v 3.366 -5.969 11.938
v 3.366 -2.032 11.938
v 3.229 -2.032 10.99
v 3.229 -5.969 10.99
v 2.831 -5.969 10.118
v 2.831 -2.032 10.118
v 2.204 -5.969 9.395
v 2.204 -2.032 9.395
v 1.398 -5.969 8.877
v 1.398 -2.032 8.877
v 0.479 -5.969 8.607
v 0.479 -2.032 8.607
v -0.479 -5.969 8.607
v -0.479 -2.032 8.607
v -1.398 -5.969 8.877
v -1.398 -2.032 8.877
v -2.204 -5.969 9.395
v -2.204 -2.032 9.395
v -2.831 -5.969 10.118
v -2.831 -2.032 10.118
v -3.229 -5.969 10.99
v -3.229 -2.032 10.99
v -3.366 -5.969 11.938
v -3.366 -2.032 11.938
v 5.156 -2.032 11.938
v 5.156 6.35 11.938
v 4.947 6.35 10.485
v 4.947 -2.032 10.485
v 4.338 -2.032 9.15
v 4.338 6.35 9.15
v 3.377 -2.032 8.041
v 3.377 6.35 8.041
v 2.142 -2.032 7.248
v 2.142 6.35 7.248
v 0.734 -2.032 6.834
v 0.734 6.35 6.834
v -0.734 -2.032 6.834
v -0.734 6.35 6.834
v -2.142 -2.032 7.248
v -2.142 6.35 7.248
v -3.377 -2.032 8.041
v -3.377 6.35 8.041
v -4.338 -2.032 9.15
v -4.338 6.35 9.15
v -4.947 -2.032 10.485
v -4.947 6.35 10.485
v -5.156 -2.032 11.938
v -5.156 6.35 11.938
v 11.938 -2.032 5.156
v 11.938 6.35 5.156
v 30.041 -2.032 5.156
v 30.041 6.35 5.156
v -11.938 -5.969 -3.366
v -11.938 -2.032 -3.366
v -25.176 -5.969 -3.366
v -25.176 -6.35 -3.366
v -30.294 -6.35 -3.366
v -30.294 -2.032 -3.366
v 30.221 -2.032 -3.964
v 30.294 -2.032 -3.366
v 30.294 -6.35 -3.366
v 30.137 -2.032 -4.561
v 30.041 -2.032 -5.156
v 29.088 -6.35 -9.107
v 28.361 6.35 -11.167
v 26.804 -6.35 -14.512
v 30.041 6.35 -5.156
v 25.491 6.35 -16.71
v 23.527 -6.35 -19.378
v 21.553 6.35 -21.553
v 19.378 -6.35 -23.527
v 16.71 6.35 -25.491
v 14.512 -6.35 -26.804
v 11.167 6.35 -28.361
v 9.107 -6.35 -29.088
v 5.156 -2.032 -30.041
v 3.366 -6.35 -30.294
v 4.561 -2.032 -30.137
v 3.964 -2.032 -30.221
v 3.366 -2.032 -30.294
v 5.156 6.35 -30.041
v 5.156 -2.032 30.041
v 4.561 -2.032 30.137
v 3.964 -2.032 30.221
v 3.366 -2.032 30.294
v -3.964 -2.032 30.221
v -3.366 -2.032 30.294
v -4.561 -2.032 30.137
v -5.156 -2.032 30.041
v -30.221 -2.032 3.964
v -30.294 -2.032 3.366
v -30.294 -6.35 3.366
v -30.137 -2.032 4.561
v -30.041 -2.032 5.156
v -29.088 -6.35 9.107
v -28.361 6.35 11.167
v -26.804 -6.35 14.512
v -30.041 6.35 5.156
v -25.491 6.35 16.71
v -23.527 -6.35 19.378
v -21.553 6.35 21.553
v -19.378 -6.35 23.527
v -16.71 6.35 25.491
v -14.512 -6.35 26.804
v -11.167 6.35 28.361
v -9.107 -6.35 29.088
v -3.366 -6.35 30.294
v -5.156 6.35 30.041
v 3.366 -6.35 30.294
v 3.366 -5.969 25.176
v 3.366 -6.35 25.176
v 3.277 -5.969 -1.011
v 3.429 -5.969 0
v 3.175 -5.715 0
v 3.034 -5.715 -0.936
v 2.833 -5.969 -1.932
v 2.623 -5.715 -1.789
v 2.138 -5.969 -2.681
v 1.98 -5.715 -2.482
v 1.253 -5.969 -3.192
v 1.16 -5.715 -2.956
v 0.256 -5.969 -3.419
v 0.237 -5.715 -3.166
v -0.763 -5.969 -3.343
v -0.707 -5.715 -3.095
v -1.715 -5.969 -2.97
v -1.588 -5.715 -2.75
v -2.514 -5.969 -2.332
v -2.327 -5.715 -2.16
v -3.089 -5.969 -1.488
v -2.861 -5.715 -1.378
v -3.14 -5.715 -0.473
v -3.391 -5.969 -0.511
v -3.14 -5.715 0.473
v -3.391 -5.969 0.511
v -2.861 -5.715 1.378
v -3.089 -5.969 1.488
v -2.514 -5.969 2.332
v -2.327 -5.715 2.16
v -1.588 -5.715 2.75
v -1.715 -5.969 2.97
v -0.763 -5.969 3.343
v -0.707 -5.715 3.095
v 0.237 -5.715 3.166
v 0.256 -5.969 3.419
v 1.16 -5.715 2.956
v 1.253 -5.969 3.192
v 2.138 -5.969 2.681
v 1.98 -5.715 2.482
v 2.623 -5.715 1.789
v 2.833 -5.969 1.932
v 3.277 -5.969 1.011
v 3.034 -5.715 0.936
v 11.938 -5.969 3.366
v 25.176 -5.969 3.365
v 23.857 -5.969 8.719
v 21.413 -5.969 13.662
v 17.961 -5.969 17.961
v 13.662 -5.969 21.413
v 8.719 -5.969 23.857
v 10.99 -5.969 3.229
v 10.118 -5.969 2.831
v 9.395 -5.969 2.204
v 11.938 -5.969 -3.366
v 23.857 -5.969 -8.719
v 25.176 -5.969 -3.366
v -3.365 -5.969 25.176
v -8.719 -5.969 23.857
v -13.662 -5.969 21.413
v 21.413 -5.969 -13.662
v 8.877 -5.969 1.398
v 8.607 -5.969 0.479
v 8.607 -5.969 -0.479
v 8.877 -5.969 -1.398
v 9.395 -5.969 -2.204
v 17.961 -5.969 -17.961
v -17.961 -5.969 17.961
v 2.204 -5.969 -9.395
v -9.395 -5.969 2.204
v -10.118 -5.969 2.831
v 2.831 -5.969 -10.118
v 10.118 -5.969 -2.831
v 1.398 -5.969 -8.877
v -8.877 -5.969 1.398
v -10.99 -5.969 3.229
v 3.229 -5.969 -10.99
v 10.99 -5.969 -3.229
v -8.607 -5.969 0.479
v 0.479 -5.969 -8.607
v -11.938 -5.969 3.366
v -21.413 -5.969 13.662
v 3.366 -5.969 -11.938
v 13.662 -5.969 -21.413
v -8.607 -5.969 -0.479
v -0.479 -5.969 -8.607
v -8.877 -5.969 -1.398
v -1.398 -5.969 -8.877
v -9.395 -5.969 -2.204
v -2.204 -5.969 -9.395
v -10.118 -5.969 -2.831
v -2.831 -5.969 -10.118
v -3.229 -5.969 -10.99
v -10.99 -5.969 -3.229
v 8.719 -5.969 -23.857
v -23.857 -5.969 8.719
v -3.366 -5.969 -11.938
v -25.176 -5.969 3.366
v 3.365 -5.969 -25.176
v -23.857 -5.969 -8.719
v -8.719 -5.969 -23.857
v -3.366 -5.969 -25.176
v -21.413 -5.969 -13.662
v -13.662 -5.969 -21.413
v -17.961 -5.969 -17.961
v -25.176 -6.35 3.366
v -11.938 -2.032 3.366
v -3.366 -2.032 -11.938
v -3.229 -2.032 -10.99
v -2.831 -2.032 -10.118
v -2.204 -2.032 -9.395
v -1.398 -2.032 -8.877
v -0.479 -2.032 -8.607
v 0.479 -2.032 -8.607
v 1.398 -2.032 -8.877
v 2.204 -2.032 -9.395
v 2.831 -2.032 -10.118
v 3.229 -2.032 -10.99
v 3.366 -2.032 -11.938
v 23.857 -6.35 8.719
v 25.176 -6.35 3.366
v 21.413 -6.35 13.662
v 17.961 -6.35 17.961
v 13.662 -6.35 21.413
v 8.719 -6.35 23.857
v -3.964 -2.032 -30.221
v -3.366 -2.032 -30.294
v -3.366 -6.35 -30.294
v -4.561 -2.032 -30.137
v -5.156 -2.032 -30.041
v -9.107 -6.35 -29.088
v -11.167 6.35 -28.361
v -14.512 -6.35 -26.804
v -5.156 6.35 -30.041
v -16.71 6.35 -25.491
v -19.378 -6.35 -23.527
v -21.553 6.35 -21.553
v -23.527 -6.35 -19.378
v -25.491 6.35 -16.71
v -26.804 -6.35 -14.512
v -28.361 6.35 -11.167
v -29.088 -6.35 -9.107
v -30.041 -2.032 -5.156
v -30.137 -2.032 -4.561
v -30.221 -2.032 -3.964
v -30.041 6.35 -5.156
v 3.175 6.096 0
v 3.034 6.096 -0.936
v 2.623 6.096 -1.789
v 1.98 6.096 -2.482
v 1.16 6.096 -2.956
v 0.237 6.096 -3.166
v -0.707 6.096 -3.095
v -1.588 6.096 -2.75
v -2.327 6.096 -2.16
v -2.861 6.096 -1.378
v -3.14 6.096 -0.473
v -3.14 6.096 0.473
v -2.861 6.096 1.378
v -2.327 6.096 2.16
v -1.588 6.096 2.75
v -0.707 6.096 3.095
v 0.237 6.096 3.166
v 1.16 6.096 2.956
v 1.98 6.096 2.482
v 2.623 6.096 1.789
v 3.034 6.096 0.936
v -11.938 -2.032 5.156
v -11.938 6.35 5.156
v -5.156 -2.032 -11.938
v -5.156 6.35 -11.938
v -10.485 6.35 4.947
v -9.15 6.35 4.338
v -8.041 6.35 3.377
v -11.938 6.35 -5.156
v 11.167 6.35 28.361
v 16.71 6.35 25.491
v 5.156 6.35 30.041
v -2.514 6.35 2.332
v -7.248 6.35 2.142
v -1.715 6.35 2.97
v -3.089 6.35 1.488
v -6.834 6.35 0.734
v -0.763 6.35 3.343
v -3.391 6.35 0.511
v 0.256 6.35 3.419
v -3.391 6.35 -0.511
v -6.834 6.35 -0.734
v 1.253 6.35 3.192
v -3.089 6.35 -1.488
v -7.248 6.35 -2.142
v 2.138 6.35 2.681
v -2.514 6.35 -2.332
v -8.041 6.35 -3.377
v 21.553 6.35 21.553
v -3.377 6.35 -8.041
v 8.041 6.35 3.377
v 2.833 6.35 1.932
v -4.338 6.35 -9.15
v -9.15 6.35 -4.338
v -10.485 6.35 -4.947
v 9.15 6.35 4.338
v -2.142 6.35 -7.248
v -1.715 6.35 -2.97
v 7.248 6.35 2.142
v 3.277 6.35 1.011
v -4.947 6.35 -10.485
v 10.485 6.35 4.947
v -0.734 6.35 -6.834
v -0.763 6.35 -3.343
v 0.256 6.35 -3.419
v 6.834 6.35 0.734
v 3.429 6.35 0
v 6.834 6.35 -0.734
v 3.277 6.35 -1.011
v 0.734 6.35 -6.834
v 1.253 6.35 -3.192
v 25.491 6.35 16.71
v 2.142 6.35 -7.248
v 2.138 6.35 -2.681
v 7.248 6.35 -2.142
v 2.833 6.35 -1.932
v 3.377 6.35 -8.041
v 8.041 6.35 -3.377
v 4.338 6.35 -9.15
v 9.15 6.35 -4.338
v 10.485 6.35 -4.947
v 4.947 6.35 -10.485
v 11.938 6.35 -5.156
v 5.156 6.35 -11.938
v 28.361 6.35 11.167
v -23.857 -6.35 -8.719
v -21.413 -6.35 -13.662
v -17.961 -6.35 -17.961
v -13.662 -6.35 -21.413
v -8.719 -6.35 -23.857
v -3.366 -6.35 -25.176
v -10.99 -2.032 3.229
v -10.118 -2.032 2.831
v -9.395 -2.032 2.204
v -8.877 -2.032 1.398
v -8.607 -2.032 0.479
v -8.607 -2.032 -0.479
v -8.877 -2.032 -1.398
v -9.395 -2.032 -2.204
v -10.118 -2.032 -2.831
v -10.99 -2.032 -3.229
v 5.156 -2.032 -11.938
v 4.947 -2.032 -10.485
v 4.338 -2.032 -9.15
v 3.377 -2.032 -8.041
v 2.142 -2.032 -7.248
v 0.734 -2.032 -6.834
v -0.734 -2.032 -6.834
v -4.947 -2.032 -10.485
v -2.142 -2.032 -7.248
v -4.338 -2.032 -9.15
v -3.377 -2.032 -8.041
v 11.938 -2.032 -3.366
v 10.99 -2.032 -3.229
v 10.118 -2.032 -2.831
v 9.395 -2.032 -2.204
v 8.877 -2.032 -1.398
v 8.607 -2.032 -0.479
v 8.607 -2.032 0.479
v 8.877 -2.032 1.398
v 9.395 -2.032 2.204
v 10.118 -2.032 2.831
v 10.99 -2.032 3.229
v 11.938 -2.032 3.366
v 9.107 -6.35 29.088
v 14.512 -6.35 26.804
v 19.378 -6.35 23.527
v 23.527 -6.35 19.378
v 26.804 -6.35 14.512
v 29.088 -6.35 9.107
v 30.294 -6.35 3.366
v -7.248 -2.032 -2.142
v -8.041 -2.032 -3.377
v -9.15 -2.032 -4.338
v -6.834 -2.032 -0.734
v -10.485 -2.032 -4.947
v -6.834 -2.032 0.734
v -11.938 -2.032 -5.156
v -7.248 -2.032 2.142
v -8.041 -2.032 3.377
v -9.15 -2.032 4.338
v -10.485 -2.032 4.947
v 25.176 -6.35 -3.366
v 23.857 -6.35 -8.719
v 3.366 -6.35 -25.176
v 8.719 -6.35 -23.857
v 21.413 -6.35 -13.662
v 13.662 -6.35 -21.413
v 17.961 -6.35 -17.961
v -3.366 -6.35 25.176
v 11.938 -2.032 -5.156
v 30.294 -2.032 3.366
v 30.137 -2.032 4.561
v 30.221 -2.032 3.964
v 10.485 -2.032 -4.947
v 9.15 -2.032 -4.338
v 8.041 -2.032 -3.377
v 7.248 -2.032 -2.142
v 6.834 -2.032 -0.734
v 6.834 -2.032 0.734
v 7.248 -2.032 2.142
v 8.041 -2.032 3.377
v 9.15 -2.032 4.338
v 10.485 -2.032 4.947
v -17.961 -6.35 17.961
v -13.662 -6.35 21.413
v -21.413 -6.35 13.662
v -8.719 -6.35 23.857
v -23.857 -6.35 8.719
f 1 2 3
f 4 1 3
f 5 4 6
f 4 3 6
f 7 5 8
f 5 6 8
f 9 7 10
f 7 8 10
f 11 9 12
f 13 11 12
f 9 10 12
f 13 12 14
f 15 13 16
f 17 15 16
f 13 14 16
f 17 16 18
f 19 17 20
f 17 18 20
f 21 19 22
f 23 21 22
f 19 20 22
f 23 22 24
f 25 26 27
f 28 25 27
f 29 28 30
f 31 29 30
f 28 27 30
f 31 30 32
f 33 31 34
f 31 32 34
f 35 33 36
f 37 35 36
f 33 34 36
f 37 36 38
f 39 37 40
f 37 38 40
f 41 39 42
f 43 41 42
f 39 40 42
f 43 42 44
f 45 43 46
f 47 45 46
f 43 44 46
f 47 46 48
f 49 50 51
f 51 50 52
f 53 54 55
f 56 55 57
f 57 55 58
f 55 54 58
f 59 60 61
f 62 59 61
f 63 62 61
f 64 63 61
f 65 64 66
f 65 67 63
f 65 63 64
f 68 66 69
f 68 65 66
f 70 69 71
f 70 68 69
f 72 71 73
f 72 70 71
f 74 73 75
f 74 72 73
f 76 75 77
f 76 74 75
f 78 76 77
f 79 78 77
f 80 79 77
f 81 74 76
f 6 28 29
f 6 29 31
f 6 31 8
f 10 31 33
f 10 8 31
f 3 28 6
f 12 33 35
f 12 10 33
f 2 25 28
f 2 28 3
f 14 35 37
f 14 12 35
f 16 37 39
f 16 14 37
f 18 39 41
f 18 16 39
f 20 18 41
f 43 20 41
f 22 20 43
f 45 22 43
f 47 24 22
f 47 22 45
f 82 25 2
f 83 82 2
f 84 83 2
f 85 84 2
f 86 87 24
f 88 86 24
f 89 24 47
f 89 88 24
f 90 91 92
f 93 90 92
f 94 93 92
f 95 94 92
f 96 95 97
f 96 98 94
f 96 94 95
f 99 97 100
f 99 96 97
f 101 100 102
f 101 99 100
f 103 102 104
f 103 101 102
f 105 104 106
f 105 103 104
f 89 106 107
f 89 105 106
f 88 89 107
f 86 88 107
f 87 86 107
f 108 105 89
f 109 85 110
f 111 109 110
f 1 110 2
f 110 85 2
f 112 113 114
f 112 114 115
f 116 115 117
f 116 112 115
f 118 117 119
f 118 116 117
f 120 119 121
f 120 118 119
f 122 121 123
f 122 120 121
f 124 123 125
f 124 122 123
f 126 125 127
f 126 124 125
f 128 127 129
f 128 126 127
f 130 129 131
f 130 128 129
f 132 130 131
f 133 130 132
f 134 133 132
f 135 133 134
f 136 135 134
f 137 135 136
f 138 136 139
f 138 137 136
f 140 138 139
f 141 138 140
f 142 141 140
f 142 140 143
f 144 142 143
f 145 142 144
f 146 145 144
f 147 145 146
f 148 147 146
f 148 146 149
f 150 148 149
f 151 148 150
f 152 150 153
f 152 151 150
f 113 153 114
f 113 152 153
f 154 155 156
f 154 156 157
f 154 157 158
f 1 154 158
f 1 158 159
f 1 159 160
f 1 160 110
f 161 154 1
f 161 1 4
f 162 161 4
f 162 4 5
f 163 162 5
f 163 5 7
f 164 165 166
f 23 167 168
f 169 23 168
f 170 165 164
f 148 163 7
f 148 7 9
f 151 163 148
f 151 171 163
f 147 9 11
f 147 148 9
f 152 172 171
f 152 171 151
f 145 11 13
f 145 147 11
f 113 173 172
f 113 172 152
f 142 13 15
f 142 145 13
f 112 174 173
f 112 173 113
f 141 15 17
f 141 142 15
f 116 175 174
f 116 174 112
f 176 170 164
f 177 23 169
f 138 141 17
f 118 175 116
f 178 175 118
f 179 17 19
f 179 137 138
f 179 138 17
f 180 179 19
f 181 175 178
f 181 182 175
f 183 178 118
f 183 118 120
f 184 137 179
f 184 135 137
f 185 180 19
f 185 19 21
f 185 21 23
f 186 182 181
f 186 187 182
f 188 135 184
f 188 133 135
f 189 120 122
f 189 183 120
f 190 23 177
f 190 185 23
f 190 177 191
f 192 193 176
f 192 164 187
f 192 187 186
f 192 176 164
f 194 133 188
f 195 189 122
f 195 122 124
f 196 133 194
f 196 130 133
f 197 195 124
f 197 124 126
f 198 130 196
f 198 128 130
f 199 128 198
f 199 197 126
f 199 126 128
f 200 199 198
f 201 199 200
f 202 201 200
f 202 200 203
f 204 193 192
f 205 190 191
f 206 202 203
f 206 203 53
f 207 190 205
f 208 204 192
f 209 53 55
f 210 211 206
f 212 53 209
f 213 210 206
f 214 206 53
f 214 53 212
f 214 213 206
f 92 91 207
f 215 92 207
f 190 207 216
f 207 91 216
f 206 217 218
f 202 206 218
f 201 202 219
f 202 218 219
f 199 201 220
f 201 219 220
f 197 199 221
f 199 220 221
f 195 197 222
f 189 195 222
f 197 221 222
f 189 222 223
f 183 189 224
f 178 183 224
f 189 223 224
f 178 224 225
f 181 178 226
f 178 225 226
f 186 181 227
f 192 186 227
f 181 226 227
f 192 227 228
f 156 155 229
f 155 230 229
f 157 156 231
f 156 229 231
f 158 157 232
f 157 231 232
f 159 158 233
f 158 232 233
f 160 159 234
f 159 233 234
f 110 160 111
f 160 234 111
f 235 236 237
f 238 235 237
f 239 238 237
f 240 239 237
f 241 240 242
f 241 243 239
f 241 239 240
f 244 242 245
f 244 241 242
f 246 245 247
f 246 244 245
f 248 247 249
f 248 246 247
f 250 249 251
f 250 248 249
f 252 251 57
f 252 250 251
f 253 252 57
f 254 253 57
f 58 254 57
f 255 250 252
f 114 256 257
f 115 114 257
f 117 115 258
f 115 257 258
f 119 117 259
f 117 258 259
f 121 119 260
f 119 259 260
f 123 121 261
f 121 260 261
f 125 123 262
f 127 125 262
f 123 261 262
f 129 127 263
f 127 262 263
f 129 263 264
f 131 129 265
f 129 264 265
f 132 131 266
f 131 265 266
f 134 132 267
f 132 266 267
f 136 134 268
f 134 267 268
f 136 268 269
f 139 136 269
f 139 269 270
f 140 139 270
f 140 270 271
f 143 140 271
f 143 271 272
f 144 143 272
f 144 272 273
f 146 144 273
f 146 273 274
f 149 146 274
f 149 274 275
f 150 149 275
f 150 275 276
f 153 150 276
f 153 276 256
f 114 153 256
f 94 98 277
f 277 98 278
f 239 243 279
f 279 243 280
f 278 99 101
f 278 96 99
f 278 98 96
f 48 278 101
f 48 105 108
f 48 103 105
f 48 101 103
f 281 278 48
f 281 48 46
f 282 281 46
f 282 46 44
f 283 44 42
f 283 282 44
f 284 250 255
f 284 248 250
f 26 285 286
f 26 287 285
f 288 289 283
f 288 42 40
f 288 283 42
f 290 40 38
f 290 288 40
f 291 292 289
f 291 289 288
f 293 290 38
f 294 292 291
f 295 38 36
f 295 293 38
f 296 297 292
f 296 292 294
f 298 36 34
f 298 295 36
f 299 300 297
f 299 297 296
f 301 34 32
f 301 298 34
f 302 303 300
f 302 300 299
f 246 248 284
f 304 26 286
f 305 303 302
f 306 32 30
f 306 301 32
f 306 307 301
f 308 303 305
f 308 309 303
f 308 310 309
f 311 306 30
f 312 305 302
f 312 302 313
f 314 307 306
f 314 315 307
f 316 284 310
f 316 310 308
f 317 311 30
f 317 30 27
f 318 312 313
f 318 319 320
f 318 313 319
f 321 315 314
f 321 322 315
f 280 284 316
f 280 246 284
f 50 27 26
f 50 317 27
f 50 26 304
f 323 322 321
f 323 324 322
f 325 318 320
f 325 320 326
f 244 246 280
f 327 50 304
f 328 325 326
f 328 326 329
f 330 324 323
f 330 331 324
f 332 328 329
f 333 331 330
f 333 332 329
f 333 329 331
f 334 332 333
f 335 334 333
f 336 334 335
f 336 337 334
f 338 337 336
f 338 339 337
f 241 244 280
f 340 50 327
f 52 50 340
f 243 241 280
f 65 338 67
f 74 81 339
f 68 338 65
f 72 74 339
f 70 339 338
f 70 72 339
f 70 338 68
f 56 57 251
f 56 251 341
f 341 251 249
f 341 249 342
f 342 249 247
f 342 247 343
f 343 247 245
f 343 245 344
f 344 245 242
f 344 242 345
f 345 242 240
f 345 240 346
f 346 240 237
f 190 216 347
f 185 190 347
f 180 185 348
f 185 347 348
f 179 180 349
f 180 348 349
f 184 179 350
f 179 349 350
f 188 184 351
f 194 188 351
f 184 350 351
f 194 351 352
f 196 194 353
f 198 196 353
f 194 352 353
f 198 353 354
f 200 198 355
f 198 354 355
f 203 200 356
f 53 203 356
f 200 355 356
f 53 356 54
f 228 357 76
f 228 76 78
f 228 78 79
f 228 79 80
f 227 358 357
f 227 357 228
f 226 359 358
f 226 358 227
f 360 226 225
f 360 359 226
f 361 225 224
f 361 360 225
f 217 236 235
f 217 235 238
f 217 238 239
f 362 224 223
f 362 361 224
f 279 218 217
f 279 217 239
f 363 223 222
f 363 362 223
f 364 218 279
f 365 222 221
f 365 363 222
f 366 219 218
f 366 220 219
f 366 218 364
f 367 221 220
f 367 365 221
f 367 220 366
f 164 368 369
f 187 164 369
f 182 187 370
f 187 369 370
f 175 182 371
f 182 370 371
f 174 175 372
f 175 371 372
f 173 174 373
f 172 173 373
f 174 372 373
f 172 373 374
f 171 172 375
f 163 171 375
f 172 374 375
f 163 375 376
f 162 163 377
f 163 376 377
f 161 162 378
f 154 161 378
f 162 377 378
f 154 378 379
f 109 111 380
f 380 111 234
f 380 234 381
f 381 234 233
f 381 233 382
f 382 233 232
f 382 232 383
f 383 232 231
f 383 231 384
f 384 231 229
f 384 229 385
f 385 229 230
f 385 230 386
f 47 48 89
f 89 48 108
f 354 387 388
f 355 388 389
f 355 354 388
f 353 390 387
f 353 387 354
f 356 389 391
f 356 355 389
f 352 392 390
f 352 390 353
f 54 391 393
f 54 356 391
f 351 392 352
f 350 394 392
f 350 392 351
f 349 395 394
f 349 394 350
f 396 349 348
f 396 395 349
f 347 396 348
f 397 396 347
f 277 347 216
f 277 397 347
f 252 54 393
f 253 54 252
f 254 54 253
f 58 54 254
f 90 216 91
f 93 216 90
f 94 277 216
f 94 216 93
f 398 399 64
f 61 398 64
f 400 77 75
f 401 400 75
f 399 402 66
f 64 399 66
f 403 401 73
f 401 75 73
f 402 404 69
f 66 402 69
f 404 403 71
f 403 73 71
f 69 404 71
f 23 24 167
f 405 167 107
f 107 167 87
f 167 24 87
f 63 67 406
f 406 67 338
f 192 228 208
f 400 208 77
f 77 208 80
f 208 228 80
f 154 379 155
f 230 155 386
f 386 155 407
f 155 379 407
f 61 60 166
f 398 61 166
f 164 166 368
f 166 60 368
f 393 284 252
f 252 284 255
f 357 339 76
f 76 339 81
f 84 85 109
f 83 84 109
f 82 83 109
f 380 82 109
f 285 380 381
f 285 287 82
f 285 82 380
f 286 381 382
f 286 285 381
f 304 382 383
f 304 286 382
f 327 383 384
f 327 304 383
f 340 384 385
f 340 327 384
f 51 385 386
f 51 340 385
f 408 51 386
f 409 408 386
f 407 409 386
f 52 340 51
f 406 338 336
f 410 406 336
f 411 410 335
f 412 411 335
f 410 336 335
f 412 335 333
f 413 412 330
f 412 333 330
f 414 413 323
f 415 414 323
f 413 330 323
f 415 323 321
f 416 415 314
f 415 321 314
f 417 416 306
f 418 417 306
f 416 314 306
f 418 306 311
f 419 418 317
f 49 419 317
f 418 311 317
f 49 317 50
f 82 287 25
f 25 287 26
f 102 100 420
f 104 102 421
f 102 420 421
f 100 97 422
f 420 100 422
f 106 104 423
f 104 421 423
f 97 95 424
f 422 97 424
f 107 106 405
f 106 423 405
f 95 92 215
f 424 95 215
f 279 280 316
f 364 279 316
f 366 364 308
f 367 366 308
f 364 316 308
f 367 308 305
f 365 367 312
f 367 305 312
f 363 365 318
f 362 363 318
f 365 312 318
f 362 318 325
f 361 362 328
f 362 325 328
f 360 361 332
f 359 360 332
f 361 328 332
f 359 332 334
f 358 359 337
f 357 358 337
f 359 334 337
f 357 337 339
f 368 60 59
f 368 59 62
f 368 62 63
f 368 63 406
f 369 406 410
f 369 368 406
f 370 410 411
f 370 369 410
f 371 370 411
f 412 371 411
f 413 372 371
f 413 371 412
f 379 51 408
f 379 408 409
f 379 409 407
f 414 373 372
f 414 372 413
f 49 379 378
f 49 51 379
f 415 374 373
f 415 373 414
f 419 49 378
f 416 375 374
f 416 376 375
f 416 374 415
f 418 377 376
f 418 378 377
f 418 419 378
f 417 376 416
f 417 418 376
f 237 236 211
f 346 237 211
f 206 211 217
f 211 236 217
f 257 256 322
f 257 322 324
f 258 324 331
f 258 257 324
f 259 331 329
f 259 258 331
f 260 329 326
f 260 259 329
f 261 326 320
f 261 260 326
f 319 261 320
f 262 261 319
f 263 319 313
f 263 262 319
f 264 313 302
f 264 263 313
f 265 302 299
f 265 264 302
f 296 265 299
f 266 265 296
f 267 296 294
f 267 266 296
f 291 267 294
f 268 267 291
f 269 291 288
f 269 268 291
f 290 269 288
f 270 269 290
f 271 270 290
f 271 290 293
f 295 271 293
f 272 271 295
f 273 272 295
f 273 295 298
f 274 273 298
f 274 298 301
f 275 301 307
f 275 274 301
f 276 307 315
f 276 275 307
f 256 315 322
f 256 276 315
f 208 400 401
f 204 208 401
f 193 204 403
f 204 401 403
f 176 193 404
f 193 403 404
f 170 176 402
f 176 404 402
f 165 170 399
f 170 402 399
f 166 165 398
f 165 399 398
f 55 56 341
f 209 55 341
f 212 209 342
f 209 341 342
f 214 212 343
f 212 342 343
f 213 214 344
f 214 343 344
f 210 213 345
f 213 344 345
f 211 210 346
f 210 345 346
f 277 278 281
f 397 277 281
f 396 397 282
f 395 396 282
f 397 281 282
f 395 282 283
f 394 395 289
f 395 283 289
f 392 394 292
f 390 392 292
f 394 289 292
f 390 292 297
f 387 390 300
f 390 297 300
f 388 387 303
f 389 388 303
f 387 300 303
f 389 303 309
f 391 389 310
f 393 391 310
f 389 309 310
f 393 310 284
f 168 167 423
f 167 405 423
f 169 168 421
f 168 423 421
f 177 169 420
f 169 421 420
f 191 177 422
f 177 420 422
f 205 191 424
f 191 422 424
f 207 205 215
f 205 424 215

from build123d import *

# Parameters (mm, degrees)
SKETCH1_W          = 30.48
SKETCH1_H          = 12.7
CUT_EXTRUDE1_DEPTH = 8.382
CUT_EXTRUDE2_DEPTH = 5.318
CUT_EXTRUDE3_DEPTH = 8.382
CUT_EXTRUDE4_DEPTH = 5.318
CUT_EXTRUDE5_DEPTH = 8.382
CUT_EXTRUDE6_DEPTH = 5.318
CUT_EXTRUDE7_DEPTH = 8.382
CUT_EXTRUDE8_DEPTH = 5.318
HOLE1_D            = 6.35
HOLE1_DEPTH        = 12.7
HOLE1_CBORE_D      = 50.8
HOLE1_CBORE_DEPTH  = 0.381
CHAMFER1_SIZE      = 0.254


with BuildPart() as part:
    # Sketch1 → Revolve1 (revolve)
    with BuildSketch(Plane(origin=(0, 0, 0), x_dir=(-1, 0, 0), z_dir=(0, 0, -1))):
        with Locations((-15.24, 0)):
            Rectangle(SKETCH1_W, SKETCH1_H)
    revolve(axis=Axis((0, -6.35, 0), (0, 1, 0)))

    # Sketch2 → Cut-Extrude1 (cut)
    with BuildSketch(Plane(origin=(0, 6.35, 0), x_dir=(-1, 0, 0), z_dir=(0, 1, 0))):
        with BuildLine():
            Line((5.1562, -30.040705743), (5.1562, -11.938))
            ThreePointArc((5.1562, -11.938), (0, -6.7818), (-5.1562, -11.938))
            Line((-5.1562, -11.938), (-5.1562, -30.040705743))
            ThreePointArc((-5.1562, -30.040705743), (0, -30.48), (5.1562, -30.040705743))
        make_face()
    extrude(amount=-CUT_EXTRUDE1_DEPTH, mode=Mode.SUBTRACT)

    # Sketch3 → Cut-Extrude2 (cut, through all)
    with BuildSketch(Plane(origin=(0, -2.032, 0), x_dir=(-1, 0, 0), z_dir=(0, 1, 0))):
        with BuildLine():
            Line((3.3655, -30.293626553), (3.3655, -11.938))
            ThreePointArc((3.3655, -11.938), (0, -8.5725), (-3.3655, -11.938))
            Line((-3.3655, -11.938), (-3.3655, -30.293626553))
            ThreePointArc((-3.3655, -30.293626553), (0, -30.48), (3.3655, -30.293626553))
        make_face()
    extrude(amount=-CUT_EXTRUDE2_DEPTH, mode=Mode.SUBTRACT)

    # Sketch4 → Cut-Extrude3 (cut)
    with BuildSketch(Plane(origin=(0, 6.35, 0), x_dir=(-1, 0, 0), z_dir=(0, 1, 0))):
        with BuildLine():
            Line((-30.040705743, -5.1562), (-11.938, -5.1562))
            ThreePointArc((-11.938, -5.1562), (-6.7818, 0), (-11.938, 5.1562))
            Line((-11.938, 5.1562), (-30.040705743, 5.1562))
            ThreePointArc((-30.040705743, 5.1562), (-30.48, 0), (-30.040705743, -5.1562))
        make_face()
    extrude(amount=-CUT_EXTRUDE3_DEPTH, mode=Mode.SUBTRACT)

    # Sketch5 → Cut-Extrude4 (cut, through all)
    with BuildSketch(Plane(origin=(0, -2.032, 0), x_dir=(-1, 0, 0), z_dir=(0, 1, 0))):
        with BuildLine():
            Line((-30.293626553, -3.3655), (-11.938, -3.3655))
            ThreePointArc((-11.938, -3.3655), (-8.5725, 0), (-11.938, 3.3655))
            Line((-11.938, 3.3655), (-30.293626553, 3.3655))
            ThreePointArc((-30.293626553, 3.3655), (-30.48, 0), (-30.293626553, -3.3655))
        make_face()
    extrude(amount=-CUT_EXTRUDE4_DEPTH, mode=Mode.SUBTRACT)

    # Sketch6 → Cut-Extrude5 (cut)
    with BuildSketch(Plane(origin=(0, 6.35, 0), x_dir=(-1, 0, 0), z_dir=(0, 1, 0))):
        with BuildLine():
            Line((-5.1562, 30.040705743), (-5.1562, 11.938))
            ThreePointArc((-5.1562, 11.938), (0, 6.7818), (5.1562, 11.938))
            Line((5.1562, 11.938), (5.1562, 30.040705743))
            ThreePointArc((5.1562, 30.040705743), (0, 30.48), (-5.1562, 30.040705743))
        make_face()
    extrude(amount=-CUT_EXTRUDE5_DEPTH, mode=Mode.SUBTRACT)

    # Sketch7 → Cut-Extrude6 (cut, through all)
    with BuildSketch(Plane(origin=(0, -2.032, 0), x_dir=(-1, 0, 0), z_dir=(0, 1, 0))):
        with BuildLine():
            Line((-3.3655, 30.293626553), (-3.3655, 11.938))
            ThreePointArc((-3.3655, 11.938), (0, 8.5725), (3.3655, 11.938))
            Line((3.3655, 11.938), (3.3655, 30.293626553))
            ThreePointArc((3.3655, 30.293626553), (0, 30.48), (-3.3655, 30.293626553))
        make_face()
    extrude(amount=-CUT_EXTRUDE6_DEPTH, mode=Mode.SUBTRACT)

    # Sketch8 → Cut-Extrude7 (cut)
    with BuildSketch(Plane(origin=(0, 6.35, 0), x_dir=(-1, 0, 0), z_dir=(0, 1, 0))):
        with BuildLine():
            Line((30.040705743, 5.1562), (11.938, 5.1562))
            ThreePointArc((11.938, 5.1562), (6.7818, 0), (11.938, -5.1562))
            Line((11.938, -5.1562), (30.040705743, -5.1562))
            ThreePointArc((30.040705743, -5.1562), (30.48, 0), (30.040705743, 5.1562))
        make_face()
    extrude(amount=-CUT_EXTRUDE7_DEPTH, mode=Mode.SUBTRACT)

    # Sketch9 → Cut-Extrude8 (cut, through all)
    with BuildSketch(Plane(origin=(0, -2.032, 0), x_dir=(-1, 0, 0), z_dir=(0, 1, 0))):
        with BuildLine():
            Line((30.293626553, 3.3655), (11.938, 3.3655))
            ThreePointArc((11.938, 3.3655), (8.5725, 0), (11.938, -3.3655))
            Line((11.938, -3.3655), (30.293626553, -3.3655))
            ThreePointArc((30.293626553, -3.3655), (30.48, 0), (30.293626553, 3.3655))
        make_face()
    extrude(amount=-CUT_EXTRUDE8_DEPTH, mode=Mode.SUBTRACT)

    # Hole1
    with Locations(Plane(origin=(0, -6.35, 0), x_dir=(-1, 0, 0), z_dir=(0, -1, 0))):
        with Locations((0, 0)):
            CounterBoreHole(HOLE1_D / 2, HOLE1_CBORE_D / 2, HOLE1_CBORE_DEPTH, depth=HOLE1_DEPTH)

    # Chamfer1
    chamfer1_edges = [part.edges().sort_by_distance(p)[0] for p in [
        (-3.175, -5.969, 0),
        (-3.175, 6.35, 0),
    ]]
    chamfer(chamfer1_edges, length=CHAMFER1_SIZE)


solid = part.part
